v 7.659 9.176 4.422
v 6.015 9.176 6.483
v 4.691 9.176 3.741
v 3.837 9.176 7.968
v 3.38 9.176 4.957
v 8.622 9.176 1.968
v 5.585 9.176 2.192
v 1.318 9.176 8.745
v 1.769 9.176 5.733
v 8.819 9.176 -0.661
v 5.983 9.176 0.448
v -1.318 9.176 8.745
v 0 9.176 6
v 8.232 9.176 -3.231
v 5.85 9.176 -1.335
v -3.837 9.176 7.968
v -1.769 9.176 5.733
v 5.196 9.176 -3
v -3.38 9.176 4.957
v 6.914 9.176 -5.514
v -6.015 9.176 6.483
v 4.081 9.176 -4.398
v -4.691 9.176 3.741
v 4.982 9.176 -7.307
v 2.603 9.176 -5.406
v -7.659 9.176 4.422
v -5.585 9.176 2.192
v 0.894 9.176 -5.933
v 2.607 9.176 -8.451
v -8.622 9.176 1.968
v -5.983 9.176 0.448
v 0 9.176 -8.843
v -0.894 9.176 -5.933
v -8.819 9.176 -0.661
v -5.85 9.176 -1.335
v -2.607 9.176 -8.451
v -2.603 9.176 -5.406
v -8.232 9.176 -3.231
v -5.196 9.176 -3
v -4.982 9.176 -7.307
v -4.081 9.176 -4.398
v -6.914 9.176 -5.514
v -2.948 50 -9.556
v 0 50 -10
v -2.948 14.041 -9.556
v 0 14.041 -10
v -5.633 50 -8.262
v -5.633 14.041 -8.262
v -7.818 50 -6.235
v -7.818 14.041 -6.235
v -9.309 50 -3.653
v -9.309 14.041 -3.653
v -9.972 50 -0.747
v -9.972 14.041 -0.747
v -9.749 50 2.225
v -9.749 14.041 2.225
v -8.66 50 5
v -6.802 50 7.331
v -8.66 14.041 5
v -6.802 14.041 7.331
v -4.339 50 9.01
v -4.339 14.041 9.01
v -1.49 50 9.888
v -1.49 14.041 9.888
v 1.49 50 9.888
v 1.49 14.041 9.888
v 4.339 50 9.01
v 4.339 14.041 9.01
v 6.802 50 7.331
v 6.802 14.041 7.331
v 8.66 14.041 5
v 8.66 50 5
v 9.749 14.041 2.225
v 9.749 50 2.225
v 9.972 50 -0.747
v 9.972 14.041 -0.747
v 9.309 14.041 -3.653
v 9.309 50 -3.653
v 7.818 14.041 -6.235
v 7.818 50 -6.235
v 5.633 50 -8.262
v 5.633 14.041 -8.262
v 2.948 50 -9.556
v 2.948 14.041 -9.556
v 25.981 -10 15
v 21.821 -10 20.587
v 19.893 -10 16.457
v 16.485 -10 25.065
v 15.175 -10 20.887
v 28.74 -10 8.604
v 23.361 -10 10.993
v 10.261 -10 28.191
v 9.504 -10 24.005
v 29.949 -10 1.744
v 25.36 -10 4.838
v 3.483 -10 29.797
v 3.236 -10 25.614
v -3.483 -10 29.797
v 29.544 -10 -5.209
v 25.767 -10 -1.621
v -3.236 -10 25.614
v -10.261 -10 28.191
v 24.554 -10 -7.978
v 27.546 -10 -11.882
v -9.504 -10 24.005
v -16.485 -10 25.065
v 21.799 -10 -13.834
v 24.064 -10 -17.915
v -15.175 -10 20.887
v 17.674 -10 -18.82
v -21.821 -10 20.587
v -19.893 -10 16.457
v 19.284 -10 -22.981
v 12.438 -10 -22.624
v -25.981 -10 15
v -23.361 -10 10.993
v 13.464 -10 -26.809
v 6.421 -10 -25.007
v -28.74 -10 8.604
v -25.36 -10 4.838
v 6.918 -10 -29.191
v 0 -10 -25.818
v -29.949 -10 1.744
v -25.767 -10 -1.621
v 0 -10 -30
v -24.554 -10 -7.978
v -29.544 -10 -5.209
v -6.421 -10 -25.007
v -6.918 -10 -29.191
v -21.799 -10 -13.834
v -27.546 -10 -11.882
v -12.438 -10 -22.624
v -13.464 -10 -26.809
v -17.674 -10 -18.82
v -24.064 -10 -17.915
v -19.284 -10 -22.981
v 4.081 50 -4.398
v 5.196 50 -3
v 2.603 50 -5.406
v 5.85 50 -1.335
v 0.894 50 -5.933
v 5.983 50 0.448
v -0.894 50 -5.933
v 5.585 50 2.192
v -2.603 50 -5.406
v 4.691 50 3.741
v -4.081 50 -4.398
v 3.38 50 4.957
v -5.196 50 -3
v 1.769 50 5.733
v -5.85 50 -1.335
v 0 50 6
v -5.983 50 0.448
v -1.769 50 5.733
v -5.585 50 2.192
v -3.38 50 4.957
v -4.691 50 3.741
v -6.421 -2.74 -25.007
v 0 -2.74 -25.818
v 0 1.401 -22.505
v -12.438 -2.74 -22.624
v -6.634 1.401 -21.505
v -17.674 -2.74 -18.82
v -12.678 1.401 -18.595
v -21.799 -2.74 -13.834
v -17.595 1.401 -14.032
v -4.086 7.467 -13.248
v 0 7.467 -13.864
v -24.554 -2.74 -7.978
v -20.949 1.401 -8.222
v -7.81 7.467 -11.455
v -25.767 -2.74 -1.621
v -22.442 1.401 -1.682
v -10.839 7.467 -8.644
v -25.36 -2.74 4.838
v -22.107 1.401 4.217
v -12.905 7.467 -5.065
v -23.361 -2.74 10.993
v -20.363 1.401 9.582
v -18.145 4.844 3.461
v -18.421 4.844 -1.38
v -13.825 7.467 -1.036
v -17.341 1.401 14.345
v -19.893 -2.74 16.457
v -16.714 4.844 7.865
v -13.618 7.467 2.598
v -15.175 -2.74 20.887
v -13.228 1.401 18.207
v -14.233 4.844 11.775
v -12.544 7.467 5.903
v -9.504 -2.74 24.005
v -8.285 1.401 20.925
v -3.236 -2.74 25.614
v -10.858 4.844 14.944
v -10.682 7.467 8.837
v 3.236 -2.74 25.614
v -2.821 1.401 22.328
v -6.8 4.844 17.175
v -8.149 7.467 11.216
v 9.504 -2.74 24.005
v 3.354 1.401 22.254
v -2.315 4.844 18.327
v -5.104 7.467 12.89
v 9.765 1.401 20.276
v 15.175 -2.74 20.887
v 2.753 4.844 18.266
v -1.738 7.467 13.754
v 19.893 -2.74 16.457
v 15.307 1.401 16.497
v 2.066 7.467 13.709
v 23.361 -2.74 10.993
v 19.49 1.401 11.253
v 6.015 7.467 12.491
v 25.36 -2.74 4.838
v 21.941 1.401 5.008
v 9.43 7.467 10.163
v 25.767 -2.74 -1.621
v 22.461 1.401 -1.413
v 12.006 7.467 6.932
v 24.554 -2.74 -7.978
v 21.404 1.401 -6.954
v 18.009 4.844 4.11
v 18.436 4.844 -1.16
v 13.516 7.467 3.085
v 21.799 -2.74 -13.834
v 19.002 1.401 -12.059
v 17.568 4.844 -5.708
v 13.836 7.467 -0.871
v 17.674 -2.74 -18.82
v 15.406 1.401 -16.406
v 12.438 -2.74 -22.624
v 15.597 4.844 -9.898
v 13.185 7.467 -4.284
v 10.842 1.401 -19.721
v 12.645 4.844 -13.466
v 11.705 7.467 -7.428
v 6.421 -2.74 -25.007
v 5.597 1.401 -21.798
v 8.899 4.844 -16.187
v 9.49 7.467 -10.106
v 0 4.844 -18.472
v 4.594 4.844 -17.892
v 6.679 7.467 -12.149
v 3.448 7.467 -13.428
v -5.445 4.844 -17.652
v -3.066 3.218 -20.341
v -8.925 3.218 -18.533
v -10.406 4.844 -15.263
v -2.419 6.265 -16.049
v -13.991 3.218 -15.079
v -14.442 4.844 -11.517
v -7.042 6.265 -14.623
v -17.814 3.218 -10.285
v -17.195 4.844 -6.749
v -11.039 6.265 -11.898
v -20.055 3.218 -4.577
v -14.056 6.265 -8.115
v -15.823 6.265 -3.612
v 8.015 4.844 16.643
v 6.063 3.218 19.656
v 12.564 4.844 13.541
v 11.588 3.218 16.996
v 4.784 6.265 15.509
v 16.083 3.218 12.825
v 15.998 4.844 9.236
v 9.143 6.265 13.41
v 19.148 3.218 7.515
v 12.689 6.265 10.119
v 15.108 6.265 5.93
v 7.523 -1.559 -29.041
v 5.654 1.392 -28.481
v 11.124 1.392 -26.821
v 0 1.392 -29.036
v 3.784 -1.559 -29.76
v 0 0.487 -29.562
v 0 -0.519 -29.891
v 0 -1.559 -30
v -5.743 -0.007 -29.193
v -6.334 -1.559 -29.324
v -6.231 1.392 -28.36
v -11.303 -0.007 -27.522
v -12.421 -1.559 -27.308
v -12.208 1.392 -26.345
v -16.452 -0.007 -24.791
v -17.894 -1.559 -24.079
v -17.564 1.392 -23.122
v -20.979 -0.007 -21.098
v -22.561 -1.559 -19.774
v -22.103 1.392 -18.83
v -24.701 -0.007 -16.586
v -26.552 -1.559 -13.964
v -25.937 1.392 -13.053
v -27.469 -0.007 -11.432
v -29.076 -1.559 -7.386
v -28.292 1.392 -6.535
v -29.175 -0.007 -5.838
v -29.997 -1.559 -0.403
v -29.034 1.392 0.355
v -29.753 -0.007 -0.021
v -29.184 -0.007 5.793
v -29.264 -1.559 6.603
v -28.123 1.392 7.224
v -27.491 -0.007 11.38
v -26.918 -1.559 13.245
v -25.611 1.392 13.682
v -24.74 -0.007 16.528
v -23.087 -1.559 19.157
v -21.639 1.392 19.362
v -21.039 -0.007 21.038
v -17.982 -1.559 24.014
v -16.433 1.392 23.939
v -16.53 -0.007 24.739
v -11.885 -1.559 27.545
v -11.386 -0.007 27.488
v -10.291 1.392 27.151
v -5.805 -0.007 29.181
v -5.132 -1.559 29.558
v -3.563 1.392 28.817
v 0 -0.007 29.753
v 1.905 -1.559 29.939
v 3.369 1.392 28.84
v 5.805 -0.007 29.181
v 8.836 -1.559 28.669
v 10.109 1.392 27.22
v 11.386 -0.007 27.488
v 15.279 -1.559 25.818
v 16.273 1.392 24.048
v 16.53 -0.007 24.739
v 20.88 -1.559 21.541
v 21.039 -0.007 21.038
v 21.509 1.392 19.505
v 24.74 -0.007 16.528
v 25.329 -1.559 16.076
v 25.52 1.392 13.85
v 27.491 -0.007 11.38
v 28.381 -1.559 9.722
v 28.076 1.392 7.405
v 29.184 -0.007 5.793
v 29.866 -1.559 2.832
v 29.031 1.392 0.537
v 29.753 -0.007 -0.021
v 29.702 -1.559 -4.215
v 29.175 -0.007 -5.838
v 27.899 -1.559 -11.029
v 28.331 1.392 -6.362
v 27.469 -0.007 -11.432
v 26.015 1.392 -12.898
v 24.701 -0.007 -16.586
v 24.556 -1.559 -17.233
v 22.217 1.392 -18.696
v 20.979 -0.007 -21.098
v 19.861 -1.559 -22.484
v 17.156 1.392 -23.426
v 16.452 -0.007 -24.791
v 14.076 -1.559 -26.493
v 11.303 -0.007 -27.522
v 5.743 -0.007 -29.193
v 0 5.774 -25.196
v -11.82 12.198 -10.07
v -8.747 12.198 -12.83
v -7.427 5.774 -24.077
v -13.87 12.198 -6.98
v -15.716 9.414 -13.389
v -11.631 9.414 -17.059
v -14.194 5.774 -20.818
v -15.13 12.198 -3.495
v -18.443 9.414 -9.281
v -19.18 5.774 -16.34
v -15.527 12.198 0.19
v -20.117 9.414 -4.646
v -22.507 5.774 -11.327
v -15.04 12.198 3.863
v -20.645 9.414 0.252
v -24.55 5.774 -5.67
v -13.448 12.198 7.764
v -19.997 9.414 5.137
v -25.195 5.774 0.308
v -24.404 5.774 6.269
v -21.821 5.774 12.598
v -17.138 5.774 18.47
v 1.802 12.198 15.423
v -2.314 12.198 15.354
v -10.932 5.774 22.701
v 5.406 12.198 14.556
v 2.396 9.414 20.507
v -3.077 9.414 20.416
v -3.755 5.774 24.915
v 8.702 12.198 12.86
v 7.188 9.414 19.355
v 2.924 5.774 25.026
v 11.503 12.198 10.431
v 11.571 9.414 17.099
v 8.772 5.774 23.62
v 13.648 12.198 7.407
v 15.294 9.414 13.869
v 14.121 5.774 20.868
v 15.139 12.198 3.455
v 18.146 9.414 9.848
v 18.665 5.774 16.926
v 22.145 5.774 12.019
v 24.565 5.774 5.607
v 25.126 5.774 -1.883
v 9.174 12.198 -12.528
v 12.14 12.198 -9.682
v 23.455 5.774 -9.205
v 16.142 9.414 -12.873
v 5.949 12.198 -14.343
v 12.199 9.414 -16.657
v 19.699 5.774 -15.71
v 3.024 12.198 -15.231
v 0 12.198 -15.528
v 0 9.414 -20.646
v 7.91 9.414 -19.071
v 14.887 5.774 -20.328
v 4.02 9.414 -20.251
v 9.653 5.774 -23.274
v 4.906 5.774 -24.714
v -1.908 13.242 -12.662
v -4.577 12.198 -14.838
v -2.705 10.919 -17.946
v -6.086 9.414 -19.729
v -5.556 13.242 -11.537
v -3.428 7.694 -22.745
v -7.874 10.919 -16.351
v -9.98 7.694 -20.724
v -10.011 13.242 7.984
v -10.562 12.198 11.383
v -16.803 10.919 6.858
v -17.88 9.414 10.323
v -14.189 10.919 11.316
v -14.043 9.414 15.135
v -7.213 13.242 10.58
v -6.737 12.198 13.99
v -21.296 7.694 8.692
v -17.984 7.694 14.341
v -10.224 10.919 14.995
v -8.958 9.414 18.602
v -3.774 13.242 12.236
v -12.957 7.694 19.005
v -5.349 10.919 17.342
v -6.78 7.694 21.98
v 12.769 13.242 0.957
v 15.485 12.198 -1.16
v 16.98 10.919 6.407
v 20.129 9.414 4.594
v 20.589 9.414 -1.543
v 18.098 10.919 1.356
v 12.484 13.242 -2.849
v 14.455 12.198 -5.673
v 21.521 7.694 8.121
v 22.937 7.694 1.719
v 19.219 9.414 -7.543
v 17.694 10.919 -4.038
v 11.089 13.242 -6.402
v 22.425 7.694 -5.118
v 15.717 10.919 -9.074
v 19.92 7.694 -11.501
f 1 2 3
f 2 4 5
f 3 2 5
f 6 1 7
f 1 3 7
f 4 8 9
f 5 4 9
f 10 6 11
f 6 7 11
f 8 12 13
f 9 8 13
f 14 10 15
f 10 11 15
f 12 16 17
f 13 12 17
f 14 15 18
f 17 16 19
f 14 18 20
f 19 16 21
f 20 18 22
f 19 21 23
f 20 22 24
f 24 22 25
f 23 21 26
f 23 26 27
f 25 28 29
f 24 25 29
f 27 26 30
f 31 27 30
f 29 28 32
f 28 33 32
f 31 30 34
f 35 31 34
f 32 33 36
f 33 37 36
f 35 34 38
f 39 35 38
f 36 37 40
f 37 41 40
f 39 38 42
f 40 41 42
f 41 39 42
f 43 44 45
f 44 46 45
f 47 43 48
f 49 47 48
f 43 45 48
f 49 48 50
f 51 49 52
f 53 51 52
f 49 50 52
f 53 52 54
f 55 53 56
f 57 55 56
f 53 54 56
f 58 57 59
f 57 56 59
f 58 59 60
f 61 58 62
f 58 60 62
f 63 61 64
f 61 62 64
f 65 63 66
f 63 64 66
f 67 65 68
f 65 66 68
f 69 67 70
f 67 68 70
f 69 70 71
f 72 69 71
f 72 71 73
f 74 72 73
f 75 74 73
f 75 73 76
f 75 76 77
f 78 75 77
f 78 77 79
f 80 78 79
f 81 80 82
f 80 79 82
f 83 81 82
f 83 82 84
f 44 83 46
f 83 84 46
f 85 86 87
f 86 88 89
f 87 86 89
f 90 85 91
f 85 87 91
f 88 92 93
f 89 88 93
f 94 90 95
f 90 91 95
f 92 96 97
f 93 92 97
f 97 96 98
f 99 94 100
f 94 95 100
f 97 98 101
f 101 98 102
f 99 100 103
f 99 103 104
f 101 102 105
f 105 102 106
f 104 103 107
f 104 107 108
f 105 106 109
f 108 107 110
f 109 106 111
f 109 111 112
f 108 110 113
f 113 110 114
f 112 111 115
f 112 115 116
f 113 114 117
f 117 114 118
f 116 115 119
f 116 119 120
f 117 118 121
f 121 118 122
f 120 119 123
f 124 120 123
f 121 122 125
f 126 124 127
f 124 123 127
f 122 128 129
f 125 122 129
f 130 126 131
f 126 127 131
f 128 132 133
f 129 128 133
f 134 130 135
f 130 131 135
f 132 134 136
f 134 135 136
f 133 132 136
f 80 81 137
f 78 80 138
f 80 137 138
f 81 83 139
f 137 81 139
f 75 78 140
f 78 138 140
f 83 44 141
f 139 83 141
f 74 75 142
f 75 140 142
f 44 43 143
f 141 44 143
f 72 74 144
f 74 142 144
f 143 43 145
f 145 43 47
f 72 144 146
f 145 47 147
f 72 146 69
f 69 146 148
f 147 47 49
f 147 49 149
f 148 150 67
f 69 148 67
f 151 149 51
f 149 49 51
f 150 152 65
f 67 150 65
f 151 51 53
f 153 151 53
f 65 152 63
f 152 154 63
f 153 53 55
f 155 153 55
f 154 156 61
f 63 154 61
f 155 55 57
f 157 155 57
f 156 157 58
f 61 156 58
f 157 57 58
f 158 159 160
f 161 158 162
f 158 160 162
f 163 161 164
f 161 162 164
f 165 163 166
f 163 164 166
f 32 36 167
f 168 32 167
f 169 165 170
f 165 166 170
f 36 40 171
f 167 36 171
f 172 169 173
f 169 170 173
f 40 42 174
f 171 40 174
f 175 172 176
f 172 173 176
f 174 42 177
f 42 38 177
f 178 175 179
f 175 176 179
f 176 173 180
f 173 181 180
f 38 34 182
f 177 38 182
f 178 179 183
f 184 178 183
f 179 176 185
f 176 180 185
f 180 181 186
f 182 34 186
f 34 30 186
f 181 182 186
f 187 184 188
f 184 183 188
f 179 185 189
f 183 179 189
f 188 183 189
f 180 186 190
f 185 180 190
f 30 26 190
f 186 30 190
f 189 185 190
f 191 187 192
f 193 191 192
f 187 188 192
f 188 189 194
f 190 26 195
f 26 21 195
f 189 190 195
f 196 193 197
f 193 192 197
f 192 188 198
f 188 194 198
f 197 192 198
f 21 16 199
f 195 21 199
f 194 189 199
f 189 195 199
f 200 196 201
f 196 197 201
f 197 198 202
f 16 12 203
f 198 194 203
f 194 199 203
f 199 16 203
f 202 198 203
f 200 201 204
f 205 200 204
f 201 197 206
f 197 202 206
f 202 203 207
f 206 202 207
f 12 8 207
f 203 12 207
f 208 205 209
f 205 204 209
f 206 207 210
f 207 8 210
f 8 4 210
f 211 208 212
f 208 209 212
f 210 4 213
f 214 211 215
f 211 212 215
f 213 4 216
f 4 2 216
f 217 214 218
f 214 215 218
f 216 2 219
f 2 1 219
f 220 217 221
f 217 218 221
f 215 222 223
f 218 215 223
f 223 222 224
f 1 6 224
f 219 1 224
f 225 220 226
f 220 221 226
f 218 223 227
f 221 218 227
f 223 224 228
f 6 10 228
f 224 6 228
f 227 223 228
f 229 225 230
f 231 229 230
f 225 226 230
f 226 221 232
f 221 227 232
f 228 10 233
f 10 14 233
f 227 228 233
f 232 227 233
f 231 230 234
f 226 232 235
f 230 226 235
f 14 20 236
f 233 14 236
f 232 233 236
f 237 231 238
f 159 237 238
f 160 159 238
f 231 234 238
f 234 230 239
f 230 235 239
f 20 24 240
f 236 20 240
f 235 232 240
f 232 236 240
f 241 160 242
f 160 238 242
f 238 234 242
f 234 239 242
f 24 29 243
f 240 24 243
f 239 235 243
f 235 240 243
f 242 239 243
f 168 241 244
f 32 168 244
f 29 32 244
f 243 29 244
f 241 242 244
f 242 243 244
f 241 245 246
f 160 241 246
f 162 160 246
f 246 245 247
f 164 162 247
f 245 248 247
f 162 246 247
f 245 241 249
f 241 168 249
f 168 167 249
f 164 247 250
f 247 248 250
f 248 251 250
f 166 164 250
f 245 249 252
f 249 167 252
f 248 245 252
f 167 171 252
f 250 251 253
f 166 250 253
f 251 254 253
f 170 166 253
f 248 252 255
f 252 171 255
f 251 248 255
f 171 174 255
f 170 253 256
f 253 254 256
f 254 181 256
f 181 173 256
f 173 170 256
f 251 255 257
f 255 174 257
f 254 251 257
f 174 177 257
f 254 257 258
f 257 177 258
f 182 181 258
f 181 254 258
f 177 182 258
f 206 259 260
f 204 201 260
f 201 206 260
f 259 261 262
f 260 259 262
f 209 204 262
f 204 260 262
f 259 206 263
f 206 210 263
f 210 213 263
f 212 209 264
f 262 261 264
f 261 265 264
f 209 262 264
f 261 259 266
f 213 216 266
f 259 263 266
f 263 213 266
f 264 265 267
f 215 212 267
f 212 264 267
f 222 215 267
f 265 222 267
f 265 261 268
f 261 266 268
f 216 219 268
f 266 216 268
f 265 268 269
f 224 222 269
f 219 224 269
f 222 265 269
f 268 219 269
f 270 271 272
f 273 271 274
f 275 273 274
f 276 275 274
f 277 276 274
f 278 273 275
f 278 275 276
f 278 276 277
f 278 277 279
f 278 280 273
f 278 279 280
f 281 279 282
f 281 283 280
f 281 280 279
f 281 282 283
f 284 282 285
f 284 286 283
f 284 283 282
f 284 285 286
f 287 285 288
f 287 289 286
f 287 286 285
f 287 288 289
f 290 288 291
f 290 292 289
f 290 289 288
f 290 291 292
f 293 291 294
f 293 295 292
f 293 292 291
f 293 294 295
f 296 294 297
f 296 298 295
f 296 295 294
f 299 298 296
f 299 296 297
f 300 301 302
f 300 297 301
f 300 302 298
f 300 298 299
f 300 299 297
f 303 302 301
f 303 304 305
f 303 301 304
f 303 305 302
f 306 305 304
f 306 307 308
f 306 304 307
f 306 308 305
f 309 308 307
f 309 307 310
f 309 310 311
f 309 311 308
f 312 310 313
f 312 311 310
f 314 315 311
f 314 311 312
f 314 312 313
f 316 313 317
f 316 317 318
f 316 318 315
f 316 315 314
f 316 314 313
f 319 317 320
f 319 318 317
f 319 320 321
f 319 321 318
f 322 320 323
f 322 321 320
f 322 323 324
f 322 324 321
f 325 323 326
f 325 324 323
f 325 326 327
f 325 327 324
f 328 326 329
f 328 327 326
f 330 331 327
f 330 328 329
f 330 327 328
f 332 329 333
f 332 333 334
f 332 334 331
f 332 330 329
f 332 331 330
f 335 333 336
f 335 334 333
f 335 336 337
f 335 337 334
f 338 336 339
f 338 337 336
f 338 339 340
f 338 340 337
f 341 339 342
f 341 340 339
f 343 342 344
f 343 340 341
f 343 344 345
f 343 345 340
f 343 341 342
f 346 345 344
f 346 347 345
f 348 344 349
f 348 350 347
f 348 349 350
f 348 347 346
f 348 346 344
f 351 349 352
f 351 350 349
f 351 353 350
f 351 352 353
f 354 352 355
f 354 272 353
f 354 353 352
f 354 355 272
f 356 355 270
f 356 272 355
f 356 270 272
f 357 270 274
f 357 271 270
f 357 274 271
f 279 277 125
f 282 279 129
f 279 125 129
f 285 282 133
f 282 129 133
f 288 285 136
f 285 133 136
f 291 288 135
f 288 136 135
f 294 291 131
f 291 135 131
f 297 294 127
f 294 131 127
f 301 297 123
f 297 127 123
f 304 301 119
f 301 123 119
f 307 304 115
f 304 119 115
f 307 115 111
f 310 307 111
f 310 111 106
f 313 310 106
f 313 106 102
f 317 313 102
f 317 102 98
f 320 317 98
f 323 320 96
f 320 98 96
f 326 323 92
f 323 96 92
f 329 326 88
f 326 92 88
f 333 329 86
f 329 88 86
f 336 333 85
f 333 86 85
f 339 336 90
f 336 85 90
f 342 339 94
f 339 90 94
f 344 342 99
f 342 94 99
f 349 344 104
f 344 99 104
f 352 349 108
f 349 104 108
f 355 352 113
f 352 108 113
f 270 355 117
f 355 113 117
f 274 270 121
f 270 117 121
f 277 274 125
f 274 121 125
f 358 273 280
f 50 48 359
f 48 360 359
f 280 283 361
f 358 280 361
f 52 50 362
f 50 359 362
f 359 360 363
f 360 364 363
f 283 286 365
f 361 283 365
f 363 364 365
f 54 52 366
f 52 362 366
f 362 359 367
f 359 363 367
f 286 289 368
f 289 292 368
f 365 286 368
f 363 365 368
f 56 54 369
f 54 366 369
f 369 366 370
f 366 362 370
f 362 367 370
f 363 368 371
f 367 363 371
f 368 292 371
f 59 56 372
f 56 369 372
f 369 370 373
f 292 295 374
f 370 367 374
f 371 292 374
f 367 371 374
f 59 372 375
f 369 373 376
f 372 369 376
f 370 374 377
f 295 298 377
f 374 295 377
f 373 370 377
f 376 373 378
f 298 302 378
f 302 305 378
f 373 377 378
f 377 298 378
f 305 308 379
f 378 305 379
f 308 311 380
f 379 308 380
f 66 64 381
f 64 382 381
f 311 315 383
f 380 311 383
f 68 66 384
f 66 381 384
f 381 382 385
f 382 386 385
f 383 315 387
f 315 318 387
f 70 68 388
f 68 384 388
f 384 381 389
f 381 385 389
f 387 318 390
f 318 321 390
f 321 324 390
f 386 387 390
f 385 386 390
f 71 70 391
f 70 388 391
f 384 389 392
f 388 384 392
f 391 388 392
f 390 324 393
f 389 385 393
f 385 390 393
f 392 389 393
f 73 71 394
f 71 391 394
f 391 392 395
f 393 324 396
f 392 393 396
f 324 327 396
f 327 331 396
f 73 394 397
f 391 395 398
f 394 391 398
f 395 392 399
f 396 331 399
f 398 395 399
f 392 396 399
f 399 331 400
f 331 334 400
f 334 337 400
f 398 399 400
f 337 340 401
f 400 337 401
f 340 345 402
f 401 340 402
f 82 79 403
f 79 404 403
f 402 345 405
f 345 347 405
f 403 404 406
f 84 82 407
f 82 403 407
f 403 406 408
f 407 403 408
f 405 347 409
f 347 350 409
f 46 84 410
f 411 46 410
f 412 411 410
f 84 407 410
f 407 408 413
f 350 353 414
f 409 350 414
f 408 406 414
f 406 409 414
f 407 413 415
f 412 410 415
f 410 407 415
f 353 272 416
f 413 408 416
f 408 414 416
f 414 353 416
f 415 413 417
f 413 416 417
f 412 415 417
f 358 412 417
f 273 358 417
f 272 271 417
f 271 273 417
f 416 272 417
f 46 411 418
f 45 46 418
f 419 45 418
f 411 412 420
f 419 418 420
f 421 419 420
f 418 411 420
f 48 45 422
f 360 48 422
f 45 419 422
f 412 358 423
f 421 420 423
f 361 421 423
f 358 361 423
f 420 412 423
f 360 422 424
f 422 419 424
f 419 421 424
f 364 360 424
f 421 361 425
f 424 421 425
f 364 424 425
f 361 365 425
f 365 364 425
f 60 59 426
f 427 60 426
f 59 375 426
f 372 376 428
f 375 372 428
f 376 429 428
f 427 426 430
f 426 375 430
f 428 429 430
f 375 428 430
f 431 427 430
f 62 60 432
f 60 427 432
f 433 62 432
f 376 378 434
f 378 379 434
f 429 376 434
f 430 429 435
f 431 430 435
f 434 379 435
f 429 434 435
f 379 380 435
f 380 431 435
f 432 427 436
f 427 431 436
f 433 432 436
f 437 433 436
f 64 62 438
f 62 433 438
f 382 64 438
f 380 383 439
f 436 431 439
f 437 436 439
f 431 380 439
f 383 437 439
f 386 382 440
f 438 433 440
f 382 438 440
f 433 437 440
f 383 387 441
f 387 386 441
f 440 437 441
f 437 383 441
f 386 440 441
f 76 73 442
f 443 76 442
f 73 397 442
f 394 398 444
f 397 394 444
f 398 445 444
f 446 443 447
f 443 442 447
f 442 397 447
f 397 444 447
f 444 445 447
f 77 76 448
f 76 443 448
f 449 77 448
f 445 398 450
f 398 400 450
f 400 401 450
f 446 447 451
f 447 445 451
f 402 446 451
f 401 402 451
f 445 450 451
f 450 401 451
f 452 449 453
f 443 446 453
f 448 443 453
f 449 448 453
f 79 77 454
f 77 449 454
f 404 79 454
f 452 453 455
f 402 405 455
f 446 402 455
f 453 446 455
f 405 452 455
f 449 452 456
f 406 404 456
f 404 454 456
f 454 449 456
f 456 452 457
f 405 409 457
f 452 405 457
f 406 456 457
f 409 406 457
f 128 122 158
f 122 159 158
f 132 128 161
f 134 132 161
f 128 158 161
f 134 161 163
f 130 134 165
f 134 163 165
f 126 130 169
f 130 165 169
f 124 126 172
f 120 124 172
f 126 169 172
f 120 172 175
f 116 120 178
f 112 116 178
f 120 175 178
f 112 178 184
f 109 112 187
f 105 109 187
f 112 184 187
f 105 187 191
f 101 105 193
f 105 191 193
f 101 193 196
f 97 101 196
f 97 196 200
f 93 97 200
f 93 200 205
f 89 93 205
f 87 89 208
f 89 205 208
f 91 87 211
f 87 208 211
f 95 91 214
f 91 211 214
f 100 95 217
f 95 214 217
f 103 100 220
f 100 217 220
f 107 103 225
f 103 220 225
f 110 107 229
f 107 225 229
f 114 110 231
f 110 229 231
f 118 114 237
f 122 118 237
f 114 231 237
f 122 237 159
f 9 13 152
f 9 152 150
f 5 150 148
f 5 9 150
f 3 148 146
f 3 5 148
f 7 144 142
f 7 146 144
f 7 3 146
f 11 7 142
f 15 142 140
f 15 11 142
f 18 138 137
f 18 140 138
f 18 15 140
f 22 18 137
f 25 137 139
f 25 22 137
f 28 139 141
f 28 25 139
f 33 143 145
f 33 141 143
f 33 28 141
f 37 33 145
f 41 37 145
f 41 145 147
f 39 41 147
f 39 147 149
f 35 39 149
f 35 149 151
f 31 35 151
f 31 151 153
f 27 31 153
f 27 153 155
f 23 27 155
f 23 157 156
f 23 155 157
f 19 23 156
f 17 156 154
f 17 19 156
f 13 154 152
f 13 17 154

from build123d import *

# Parameters (mm, degrees)
SKIZZE4_R                       = 6
SCHNITT_LINEAR_AUSTRAGEN2_DEPTH = 51
VERRUNDUNG2_R                   = 5


with BuildPart() as part:
    # Skizze2 → Rotation2 (revolve)
    with BuildSketch(Plane.XY, mode=Mode.PRIVATE) as rotation2_sk:
        with BuildLine():
            Line((0, 14.040713887), (0, 50))
            Line((0, 50), (-10, 50))
            Line((-10, 50), (-10, 14.040713887))
            ThreePointArc((-10, 14.040713887), (-21.345292125, 8.936630056), (-30, 0))
            Line((-30, 0), (-30, -10))
            Line((-30, -10), (-25.817799793, -10))
            Line((-25.817799793, -10), (-25.817799793, -2.740292215))
            ThreePointArc((-25.817799793, -2.740292215), (-18.472392098, 4.844387952), (-8.843436705, 9.176316562))
            Line((-8.843436705, 9.176316562), (0, 9.176316562))
            Line((0, 9.176316562), (0, 14.040713887))
        make_face()
    revolve(rotation2_sk.sketch.rotate(Axis((0, 14.040713887, 0), (0, 1, 0)), 270), axis=Axis((0, 14.040713887, 0), (0, 1, 0)))  # turned: the seam where the file's is

    # Skizze4 → Schnitt-Linear austragen2 (cut, through all)
    with BuildSketch(Plane(origin=(0, 0, 0), x_dir=(1, 0, 0), z_dir=(0, 1, 0))):
        with Locations(Location((0, 0, 0), (0, 0, 270))):  # turned: the seam where the file's is
            Circle(SKIZZE4_R)
    extrude(amount=SCHNITT_LINEAR_AUSTRAGEN2_DEPTH, mode=Mode.SUBTRACT)

    # Verrundung2
    verrundung2_edges = [part.edges().sort_by_distance(p)[0] for p in [
        (0, 0, 30),
    ]]
    fillet(verrundung2_edges, radius=VERRUNDUNG2_R)


solid = part.part
